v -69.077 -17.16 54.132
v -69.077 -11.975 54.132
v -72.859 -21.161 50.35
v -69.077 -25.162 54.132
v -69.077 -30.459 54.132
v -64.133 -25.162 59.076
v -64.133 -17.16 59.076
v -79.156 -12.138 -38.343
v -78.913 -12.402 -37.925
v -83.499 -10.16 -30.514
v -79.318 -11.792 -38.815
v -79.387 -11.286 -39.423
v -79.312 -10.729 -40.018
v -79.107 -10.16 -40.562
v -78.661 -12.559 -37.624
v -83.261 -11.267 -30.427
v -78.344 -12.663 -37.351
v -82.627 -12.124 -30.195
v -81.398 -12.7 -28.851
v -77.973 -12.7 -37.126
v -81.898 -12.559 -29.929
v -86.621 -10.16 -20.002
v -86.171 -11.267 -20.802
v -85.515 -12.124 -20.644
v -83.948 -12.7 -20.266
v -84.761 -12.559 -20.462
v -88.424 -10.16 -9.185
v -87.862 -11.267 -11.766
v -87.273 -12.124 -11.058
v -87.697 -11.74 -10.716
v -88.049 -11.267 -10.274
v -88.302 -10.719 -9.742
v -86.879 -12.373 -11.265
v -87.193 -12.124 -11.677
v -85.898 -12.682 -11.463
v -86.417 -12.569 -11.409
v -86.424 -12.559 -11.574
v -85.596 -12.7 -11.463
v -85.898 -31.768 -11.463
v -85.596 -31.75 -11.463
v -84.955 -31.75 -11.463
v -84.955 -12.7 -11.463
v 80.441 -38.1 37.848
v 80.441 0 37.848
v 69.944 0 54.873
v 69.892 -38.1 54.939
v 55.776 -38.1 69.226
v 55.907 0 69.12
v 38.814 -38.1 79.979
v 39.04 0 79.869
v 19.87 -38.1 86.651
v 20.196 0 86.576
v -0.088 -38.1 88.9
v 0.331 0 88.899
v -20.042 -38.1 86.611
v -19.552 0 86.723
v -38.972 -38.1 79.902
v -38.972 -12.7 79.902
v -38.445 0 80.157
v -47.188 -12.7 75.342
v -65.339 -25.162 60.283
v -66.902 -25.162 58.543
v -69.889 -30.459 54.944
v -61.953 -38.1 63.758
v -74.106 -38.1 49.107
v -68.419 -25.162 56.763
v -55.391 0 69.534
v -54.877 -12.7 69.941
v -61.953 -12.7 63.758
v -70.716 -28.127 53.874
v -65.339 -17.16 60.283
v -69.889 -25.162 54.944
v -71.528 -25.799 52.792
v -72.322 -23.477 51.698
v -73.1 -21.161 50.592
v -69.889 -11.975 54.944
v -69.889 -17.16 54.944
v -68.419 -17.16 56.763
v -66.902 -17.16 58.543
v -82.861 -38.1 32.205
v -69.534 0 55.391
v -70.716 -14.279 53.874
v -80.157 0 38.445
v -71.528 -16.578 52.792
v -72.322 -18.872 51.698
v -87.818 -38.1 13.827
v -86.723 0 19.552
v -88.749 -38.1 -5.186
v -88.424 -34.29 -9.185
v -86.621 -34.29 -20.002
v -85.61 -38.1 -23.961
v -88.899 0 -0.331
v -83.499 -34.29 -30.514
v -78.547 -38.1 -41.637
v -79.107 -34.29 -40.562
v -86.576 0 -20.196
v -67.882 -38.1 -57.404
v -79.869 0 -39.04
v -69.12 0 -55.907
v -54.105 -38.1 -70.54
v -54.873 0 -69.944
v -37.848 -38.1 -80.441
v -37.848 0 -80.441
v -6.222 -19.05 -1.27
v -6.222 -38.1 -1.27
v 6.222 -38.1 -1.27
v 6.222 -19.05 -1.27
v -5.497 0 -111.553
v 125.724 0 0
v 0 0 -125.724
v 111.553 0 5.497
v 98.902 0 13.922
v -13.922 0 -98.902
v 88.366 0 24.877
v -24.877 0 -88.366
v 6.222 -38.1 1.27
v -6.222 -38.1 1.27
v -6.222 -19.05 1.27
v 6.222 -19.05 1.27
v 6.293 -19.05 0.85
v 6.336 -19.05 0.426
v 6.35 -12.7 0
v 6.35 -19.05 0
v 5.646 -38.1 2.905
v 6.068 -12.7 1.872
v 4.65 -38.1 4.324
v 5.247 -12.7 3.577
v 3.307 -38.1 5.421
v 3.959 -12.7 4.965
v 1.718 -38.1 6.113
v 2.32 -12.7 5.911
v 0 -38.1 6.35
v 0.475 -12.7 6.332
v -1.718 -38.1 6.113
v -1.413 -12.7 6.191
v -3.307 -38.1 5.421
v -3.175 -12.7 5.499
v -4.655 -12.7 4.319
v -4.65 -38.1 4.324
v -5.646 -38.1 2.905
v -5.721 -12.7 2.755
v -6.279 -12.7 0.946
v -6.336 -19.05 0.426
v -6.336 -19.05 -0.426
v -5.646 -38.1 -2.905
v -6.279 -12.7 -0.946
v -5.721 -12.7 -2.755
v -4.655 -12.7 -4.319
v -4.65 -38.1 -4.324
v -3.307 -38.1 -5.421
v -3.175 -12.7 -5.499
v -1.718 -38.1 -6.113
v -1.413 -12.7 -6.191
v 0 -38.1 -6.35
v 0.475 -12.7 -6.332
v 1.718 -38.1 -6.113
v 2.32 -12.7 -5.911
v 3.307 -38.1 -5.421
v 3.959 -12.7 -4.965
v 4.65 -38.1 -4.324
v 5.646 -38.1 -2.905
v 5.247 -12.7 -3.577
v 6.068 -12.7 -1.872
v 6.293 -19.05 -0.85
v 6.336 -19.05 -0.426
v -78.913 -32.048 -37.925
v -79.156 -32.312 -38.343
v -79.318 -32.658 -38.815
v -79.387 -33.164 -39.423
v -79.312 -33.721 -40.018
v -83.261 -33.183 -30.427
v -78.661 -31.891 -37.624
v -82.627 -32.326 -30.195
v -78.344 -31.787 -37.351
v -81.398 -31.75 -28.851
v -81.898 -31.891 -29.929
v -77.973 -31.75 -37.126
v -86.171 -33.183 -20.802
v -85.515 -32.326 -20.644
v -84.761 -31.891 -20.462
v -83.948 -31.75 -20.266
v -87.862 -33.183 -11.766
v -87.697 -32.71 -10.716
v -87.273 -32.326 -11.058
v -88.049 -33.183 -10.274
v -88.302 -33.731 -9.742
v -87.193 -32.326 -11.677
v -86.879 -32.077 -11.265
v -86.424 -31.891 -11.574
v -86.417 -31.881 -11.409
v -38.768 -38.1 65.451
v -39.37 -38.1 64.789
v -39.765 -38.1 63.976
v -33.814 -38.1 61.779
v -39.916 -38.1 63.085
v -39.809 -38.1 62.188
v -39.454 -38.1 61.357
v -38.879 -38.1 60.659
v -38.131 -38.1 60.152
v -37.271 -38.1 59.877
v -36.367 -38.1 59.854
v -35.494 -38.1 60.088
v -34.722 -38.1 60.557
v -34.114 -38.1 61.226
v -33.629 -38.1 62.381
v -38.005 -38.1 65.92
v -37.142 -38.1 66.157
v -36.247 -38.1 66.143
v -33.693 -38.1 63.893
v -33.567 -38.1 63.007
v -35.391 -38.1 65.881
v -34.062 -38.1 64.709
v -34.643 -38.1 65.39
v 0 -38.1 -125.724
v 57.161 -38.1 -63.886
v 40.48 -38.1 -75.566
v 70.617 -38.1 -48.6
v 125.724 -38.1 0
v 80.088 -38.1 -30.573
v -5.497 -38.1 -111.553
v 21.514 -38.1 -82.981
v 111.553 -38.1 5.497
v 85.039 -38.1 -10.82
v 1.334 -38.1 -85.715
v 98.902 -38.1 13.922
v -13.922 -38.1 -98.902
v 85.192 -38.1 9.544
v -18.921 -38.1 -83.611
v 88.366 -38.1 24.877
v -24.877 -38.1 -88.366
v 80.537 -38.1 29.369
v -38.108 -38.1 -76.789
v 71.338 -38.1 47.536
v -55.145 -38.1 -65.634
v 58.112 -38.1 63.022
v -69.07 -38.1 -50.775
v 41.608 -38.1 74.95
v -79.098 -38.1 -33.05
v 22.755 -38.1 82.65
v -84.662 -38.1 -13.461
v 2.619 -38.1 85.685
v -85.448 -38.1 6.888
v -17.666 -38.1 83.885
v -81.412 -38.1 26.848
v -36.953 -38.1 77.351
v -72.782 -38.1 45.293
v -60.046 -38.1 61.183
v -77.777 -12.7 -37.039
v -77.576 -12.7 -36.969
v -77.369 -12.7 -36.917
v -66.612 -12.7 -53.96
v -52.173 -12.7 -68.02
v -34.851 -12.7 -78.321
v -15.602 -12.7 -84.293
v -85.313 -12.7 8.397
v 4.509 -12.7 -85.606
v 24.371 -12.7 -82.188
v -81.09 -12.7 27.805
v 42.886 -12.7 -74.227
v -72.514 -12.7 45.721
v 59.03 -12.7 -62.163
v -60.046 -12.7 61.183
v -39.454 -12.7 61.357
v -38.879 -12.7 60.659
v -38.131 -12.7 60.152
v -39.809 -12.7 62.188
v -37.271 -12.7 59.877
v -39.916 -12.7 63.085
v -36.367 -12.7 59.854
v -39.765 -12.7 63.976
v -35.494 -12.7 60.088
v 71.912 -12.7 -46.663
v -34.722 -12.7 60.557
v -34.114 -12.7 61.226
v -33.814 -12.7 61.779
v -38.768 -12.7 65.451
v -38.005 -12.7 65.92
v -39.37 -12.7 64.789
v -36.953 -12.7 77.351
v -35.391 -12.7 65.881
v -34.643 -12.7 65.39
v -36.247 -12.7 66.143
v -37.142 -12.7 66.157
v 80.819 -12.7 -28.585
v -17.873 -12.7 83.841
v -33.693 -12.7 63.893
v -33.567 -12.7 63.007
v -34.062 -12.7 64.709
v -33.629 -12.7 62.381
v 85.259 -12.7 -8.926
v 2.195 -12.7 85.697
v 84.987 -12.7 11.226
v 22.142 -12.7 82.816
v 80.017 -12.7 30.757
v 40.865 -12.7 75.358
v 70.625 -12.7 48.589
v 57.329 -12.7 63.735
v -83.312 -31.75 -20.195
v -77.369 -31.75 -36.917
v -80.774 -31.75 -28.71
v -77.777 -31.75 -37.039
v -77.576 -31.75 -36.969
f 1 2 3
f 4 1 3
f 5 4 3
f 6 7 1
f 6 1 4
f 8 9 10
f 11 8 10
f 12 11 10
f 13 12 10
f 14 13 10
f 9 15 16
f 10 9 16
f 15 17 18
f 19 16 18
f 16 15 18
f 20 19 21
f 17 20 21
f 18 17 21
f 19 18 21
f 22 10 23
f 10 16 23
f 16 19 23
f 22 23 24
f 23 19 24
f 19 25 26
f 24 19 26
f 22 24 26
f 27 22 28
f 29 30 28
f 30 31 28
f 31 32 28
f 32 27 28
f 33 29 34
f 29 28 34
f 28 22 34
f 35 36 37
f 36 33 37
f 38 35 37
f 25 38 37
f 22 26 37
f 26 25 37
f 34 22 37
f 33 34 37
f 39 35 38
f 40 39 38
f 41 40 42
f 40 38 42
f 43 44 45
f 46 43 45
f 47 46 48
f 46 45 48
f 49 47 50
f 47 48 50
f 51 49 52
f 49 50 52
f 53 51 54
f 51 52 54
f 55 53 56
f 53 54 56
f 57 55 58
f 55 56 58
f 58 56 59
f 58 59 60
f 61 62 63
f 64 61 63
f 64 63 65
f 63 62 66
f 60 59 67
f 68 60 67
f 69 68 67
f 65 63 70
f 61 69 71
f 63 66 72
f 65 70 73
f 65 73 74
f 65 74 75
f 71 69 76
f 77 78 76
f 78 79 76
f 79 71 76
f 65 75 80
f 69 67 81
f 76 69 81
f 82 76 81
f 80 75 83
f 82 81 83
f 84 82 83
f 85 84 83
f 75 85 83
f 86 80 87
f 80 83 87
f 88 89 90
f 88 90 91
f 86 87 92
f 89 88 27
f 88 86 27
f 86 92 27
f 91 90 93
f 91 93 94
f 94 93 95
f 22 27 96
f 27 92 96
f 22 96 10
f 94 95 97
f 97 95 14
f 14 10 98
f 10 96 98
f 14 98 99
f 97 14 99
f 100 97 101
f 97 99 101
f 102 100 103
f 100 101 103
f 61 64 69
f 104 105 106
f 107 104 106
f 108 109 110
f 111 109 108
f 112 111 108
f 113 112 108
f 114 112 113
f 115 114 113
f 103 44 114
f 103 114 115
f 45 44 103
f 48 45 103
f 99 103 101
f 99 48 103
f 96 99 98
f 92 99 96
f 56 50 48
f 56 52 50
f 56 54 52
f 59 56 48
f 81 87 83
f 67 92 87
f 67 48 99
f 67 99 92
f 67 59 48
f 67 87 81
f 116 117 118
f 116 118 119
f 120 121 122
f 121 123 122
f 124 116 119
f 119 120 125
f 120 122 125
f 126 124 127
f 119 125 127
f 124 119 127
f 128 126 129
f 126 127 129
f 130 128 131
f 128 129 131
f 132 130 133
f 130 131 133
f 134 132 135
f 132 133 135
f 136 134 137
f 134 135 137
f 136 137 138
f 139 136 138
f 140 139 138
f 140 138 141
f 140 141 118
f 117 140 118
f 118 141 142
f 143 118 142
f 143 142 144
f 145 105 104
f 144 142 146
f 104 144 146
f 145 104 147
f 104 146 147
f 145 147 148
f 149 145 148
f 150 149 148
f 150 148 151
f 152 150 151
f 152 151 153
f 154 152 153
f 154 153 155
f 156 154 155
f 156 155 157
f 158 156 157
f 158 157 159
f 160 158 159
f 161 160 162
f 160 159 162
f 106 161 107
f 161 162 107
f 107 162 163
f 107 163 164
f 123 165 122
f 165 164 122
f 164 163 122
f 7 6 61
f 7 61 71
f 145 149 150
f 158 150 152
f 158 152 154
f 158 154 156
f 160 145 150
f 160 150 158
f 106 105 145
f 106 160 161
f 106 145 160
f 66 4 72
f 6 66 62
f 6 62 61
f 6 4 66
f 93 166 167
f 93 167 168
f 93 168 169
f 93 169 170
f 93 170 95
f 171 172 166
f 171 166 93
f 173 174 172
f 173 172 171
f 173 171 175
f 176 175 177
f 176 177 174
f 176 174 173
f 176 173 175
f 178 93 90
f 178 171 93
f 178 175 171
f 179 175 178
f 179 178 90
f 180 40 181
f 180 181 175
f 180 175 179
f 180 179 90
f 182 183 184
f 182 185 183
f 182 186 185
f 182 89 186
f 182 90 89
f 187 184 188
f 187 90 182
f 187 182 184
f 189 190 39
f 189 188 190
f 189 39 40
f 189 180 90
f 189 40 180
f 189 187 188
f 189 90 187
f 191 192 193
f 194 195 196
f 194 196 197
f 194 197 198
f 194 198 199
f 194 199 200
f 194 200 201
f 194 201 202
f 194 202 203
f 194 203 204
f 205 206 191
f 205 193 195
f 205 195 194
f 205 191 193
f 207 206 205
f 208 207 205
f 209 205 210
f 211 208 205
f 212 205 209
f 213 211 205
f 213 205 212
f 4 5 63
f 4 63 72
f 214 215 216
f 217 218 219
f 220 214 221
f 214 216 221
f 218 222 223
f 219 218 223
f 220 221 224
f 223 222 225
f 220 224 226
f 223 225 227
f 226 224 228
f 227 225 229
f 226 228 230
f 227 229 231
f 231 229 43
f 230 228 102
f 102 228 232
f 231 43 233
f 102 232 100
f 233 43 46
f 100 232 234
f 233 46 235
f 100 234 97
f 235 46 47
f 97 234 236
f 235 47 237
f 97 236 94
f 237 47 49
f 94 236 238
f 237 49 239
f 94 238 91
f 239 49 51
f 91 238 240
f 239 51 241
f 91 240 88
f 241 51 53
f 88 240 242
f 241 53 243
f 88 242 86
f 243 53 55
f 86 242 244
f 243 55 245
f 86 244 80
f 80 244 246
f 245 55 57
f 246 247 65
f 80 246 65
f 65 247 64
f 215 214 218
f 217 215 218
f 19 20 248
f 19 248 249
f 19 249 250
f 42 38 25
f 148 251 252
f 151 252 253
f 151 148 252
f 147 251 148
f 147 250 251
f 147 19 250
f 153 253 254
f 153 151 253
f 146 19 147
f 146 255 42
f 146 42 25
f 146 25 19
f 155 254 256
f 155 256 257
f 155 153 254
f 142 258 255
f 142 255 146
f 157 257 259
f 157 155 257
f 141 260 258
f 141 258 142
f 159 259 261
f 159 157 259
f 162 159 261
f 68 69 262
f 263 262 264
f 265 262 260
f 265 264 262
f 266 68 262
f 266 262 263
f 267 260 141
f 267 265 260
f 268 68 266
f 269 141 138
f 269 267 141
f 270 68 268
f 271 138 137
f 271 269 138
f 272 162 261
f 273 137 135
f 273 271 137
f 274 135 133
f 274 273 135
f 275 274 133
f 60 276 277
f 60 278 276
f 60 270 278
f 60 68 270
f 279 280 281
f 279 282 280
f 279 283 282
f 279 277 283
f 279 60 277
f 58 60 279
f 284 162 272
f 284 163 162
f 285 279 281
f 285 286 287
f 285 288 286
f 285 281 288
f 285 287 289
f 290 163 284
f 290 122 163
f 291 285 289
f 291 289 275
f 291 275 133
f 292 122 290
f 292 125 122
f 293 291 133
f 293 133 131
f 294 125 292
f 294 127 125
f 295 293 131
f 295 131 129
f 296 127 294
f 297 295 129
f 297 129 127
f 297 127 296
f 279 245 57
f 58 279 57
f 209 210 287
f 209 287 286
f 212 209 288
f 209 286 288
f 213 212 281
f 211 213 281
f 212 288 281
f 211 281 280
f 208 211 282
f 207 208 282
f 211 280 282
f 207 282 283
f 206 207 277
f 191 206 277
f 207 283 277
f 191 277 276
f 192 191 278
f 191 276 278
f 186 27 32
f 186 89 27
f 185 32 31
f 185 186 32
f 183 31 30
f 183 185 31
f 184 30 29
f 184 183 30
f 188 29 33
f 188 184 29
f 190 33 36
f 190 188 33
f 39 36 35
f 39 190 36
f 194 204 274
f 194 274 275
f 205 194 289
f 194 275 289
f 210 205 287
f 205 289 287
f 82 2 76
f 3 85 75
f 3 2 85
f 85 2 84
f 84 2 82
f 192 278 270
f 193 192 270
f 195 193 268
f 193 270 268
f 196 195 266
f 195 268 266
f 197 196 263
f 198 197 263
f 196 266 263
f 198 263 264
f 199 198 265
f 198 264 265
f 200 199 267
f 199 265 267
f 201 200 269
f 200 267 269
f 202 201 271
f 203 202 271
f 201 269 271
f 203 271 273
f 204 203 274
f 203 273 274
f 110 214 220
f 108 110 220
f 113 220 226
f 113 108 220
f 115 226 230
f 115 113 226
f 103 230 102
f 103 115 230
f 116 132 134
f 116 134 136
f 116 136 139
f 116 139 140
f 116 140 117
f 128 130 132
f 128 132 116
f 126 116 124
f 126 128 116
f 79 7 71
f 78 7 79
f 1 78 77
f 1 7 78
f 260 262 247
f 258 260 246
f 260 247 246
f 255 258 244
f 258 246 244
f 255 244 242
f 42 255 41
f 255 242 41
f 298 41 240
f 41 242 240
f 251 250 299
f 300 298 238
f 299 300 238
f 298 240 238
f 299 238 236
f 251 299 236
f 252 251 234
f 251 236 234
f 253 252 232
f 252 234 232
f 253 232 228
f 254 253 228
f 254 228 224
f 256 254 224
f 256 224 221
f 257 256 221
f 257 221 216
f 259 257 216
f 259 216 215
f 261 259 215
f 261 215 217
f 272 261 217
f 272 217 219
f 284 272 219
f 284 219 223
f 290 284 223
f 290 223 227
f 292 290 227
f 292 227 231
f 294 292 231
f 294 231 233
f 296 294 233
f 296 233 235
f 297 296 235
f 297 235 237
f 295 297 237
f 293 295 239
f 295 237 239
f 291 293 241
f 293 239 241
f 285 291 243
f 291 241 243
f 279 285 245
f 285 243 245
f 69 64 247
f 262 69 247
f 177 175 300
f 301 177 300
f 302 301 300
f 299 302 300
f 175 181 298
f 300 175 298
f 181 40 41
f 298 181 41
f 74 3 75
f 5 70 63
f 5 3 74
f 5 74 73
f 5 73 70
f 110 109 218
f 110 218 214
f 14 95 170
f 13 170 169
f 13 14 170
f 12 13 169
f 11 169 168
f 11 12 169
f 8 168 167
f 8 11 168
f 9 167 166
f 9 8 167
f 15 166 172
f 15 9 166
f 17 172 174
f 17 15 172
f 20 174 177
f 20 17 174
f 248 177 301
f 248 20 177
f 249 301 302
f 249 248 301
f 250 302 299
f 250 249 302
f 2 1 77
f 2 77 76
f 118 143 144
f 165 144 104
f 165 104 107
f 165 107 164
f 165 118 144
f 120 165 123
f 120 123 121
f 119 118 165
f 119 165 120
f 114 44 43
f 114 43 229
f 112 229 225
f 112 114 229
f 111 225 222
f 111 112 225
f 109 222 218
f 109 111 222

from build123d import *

# Parameters (mm, degrees)
F0_R          = 88.9
F1_DEPTH      = 12.7
F2_R          = 88.9
F2_R_2        = 82.55
F2_R_3        = 6.35
F3_DEPTH      = 25.4
F5_DEPTH      = 25.4
F7_DEPTH      = 25.4
F8_W          = 12.7
F8_H          = 1.27
F9_DEPTH      = 19.05
F10_W         = 19.05
F10_H         = 25.4
F11_DEPTH     = 88.901
F12_T1_DEPTH  = 19.05
F12_T6_ANGLE  = 25.274429264
F12_T12_ANGLE = 25.274429264
F12_T19_ANGLE = 25.274429264
F12_T23_DEPTH = 24.7827133537
F12_T30_ANGLE = 25.274429264
F12_T34_DEPTH = 24.7827133537
F12_T41_DEPTH = 29.3229812516
F12_T45_ANGLE = 25.274429264
F12_T52_ANGLE = 25.274429264
F12_T56_DEPTH = 29.3229812516
F14_DEPTH     = 25.4
F16_DEPTH     = 38.1
F20_DEPTH     = 25.4


# Not quite as in the source:
# - a fillet or chamfer that OpenCascade refuses, or shapes differently, is made with other operations: its cross-section is extruded or revolved along the edge and cut away or added


with BuildPart() as f1:
    # F0 (on Front) → F1 (new body)
    with BuildSketch(Plane.XZ):
        Circle(F0_R)
    extrude(amount=F1_DEPTH)

    # F2 (on face) → F3 (join)
    with BuildSketch(Plane.XZ.offset(12.7)):
        Circle(F2_R)
        Circle(F2_R_2, mode=Mode.SUBTRACT)
        Circle(F2_R_3)
    extrude(amount=F3_DEPTH)

    # F4 (on face) → F5 (cut)
    with BuildSketch(Plane.XZ.offset(38.1)):
        with BuildLine():
            Line((-34.9300524425, 74.7956812681), (-38.9724939218, 79.9021571518))
            ThreePointArc((-38.9724939218, 79.9021571518), (-51.1040456605, 72.7432919047), (-61.9525410202, 63.7580791833))
            Line((-61.9525410202, 63.7580791833), (-58.1372414147, 58.6051504621))
            ThreePointArc((-58.1372414147, 58.6051504621), (-47.2325482948, 67.7022073612), (-34.9300524425, 74.7956812681))
        make_face()
    extrude(amount=-F5_DEPTH, mode=Mode.SUBTRACT)

    # F6 (on face) → F7 (join)
    with BuildSketch(Plane.XZ.offset(12.7)):
        with BuildLine():
            ThreePointArc((-33.5668462981, 63.0071964846), (-35.8100364522, 66.042382708), (-39.3699048248, 64.7887501268))
            Line((-39.3699048248, 64.7887501268), (-34.1137877714, 61.2256428423))
            ThreePointArc((-34.1137877714, 61.2256428423), (-33.7066600747, 62.0753866387), (-33.5668462981, 63.0071964846))
        make_face()
        with BuildLine():
            Line((-34.1137877714, 61.2256428423), (-39.3699048248, 64.7887501268))
            ThreePointArc((-39.3699048248, 64.7887501268), (-38.5233999404, 60.3791379579), (-34.1137877714, 61.2256428423))
        make_face()
    extrude(amount=F7_DEPTH)

    # F8 (on face) → F9 (cut)
    with BuildSketch(Plane.XZ.offset(38.1)):
        with Locations((0, 0.635)):
            Rectangle(F8_W, F8_H)
        with Locations((0, -0.635)):
            Rectangle(F8_W, F8_H)
    extrude(amount=-F9_DEPTH, mode=Mode.SUBTRACT)

    # F10 (on Right) → F11 (cut, through all)
    with BuildSketch(Plane.YZ):
        with Locations((-22.225, -24.1626900017)):
            Rectangle(F10_W, F10_H)
    extrude(amount=-F11_DEPTH, mode=Mode.SUBTRACT)

    # F12: fillet of radius 2.54 on 4 edges, made by hand

    # F12_s2 → F12_t1 (cut)
    with BuildSketch(Plane.XZ.offset(12.7)):
        with BuildLine():
            ThreePointArc((-88.4242248071, -9.1851220606), (-87.5985568369, -10.8092447226), (-85.897818384, -11.4626900017))
            Line((-85.897818384, -11.4626900017), (-88.1579079716, -11.4626900017))
            ThreePointArc((-88.1579079716, -11.4626900017), (-88.2984101391, -10.3247647385), (-88.4242248071, -9.1851220606))
        make_face()
        with BuildLine():
            ThreePointArc((-79.1073144645, -40.5615926488), (-79.0145016969, -38.078305753), (-76.8471054798, -36.8626900017))
            Line((-76.8471054798, -36.8626900017), (-80.8971698259, -36.8626900017))
            ThreePointArc((-80.8971698259, -36.8626900017), (-80.0236166295, -38.7224841861), (-79.1073144645, -40.5615926488))
        make_face()
    extrude(amount=F12_T1_DEPTH, mode=Mode.SUBTRACT)


with BuildPart() as f12_tool4:
    # F12_s5 → F12_t6 (revolve)
    with BuildSketch(Plane(origin=(0, 0, 0), x_dir=(0, 1, 0), z_dir=(0.478540272, 0, -0.8780656058))):
        with BuildLine():
            ThreePointArc((-10.16, -88.9), (-11.9560512242, -88.1560512242), (-12.7, -86.36))
            Line((-12.7, -86.36), (-12.7, -88.9))
            Line((-12.7, -88.9), (-10.16, -88.9))
        make_face()
    revolve(axis=Axis((0, -12.7, 0), (0, 1, 0)), revolution_arc=F12_T6_ANGLE)

    split(bisect_by=Plane.XY.offset(-11.4626900017), keep=Keep.BOTTOM)

    split(bisect_by=Plane.XY.offset(-36.8626900017), keep=Keep.TOP)


with BuildPart() as f1_1:
    add(f1.part)

    # F12_t3: cut F12_tool4
    add(f12_tool4.part, mode=Mode.SUBTRACT)


with BuildPart() as f12_tool10:
    # F12_s11 → F12_t12 (revolve)
    with BuildSketch(Plane(origin=(0, 0, 0), x_dir=(0, 1, 0), z_dir=(0.478540272, 0, -0.8780656058))):
        with BuildLine():
            ThreePointArc((-34.29, -88.9), (-32.4939487758, -88.1560512242), (-31.75, -86.36))
            Line((-31.75, -86.36), (-31.75, -88.9))
            Line((-31.75, -88.9), (-34.29, -88.9))
        make_face()
    revolve(axis=Axis((0, -31.75, 0), (0, 1, 0)), revolution_arc=F12_T12_ANGLE)

    split(bisect_by=Plane.XY.offset(-36.8626900017), keep=Keep.TOP)

    split(bisect_by=Plane.XY.offset(-11.4626900017), keep=Keep.BOTTOM)


with BuildPart() as f1_2:
    add(f1_1.part)

    # F12_t9: cut F12_tool10
    add(f12_tool10.part, mode=Mode.SUBTRACT)


with BuildPart() as f12_tool17:
    # F12_s18 → F12_t19 (revolve)
    with BuildSketch(Plane(origin=(0, 0, 0), x_dir=(0, 1, 0), z_dir=(0.478540272, 0, -0.8780656058))):
        with BuildLine():
            ThreePointArc((-34.29, -88.9), (-32.4939487758, -88.1560512242), (-31.75, -86.36))
            Line((-31.75, -86.36), (-31.75, -88.9))
            Line((-31.75, -88.9), (-34.29, -88.9))
        make_face()
    revolve(axis=Axis((0, -31.75, 0), (0, 1, 0)), revolution_arc=F12_T19_ANGLE)

    split(bisect_by=Plane.XY.offset(-11.4626900017), keep=Keep.TOP)


with BuildPart() as f12_tool21:
    # F12_s22 → F12_t23 (new body)
    with BuildSketch(Plane.XZ.offset(37.4827133537)):
        with BuildLine():
            ThreePointArc((-88.4242248071, -9.1851220606), (-87.5985568369, -10.8092447226), (-85.897818384, -11.4626900017))
            Line((-85.897818384, -11.4626900017), (-88.1579079716, -11.4626900017))
            ThreePointArc((-88.1579079716, -11.4626900017), (-88.2984101391, -10.3247647385), (-88.4242248071, -9.1851220606))
        make_face()
    extrude(amount=-F12_T23_DEPTH)

    split(bisect_by=Plane.XZ.offset(31.75), keep=Keep.TOP)


with BuildPart() as f12_tool17_1:
    add(f12_tool17.part)

    # F12_t25: intersect F12_tool21
    add(f12_tool21.part, mode=Mode.INTERSECT)


with BuildPart() as f1_3:
    add(f1_2.part)

    # F12_t15: cut F12_tool17
    add(f12_tool17_1.part, mode=Mode.SUBTRACT)


with BuildPart() as f12_tool28:
    # F12_s29 → F12_t30 (revolve)
    with BuildSketch(Plane(origin=(0, 0, 0), x_dir=(0, 1, 0), z_dir=(0.478540272, 0, -0.8780656058))):
        with BuildLine():
            ThreePointArc((-10.16, -88.9), (-11.9560512242, -88.1560512242), (-12.7, -86.36))
            Line((-12.7, -86.36), (-12.7, -88.9))
            Line((-12.7, -88.9), (-10.16, -88.9))
        make_face()
    revolve(axis=Axis((0, -12.7, 0), (0, 1, 0)), revolution_arc=F12_T30_ANGLE)

    split(bisect_by=Plane.XY.offset(-11.4626900017), keep=Keep.TOP)


with BuildPart() as f12_tool32:
    # F12_s33 → F12_t34 (new body)
    with BuildSketch(Plane.XZ.offset(31.75)):
        with BuildLine():
            ThreePointArc((-88.4242248071, -9.1851220606), (-87.5985568369, -10.8092447226), (-85.897818384, -11.4626900017))
            Line((-85.897818384, -11.4626900017), (-88.1579079716, -11.4626900017))
            ThreePointArc((-88.1579079716, -11.4626900017), (-88.2984101391, -10.3247647385), (-88.4242248071, -9.1851220606))
        make_face()
    extrude(amount=-F12_T34_DEPTH)

    split(bisect_by=Plane.XZ.offset(12.7), keep=Keep.BOTTOM)


with BuildPart() as f12_tool28_1:
    add(f12_tool28.part)

    # F12_t36: intersect F12_tool32
    add(f12_tool32.part, mode=Mode.INTERSECT)


with BuildPart() as f1_4:
    add(f1_3.part)

    # F12_t26: cut F12_tool28
    add(f12_tool28_1.part, mode=Mode.SUBTRACT)


with BuildPart() as f12_tool39:
    # F12_s40 → F12_t41 (new body)
    with BuildSketch(Plane.XZ.offset(31.75)):
        with BuildLine():
            ThreePointArc((-79.1073144645, -40.5615926488), (-79.0145016969, -38.078305753), (-76.8471054798, -36.8626900017))
            Line((-76.8471054798, -36.8626900017), (-80.8971698259, -36.8626900017))
            ThreePointArc((-80.8971698259, -36.8626900017), (-80.0236166295, -38.7224841861), (-79.1073144645, -40.5615926488))
        make_face()
    extrude(amount=-F12_T41_DEPTH)

    split(bisect_by=Plane.XZ.offset(12.7), keep=Keep.BOTTOM)


with BuildPart() as f12_tool43:
    # F12_s44 → F12_t45 (revolve)
    with BuildSketch(Plane(origin=(0, 0, 0), x_dir=(0, 1, 0), z_dir=(0.478540272, 0, -0.8780656058))):
        with BuildLine():
            ThreePointArc((-10.16, -88.9), (-11.9560512242, -88.1560512242), (-12.7, -86.36))
            Line((-12.7, -86.36), (-12.7, -88.9))
            Line((-12.7, -88.9), (-10.16, -88.9))
        make_face()
    revolve(axis=Axis((0, -12.7, 0), (0, 1, 0)), revolution_arc=F12_T45_ANGLE)

    split(bisect_by=Plane.XY.offset(-36.8626900017), keep=Keep.BOTTOM)


with BuildPart() as f12_tool39_1:
    add(f12_tool39.part)

    # F12_t47: intersect F12_tool43
    add(f12_tool43.part, mode=Mode.INTERSECT)


with BuildPart() as f1_5:
    add(f1_4.part)

    # F12_t37: cut F12_tool39
    add(f12_tool39_1.part, mode=Mode.SUBTRACT)


with BuildPart() as f12_tool50:
    # F12_s51 → F12_t52 (revolve)
    with BuildSketch(Plane(origin=(0, 0, 0), x_dir=(0, 1, 0), z_dir=(0.478540272, 0, -0.8780656058))):
        with BuildLine():
            ThreePointArc((-34.29, -88.9), (-32.4939487758, -88.1560512242), (-31.75, -86.36))
            Line((-31.75, -86.36), (-31.75, -88.9))
            Line((-31.75, -88.9), (-34.29, -88.9))
        make_face()
    revolve(axis=Axis((0, -31.75, 0), (0, 1, 0)), revolution_arc=F12_T52_ANGLE)

    split(bisect_by=Plane.XY.offset(-36.8626900017), keep=Keep.BOTTOM)


with BuildPart() as f12_tool54:
    # F12_s55 → F12_t56 (new body)
    with BuildSketch(Plane.XZ.offset(42.0229812516)):
        with BuildLine():
            ThreePointArc((-79.1073144645, -40.5615926488), (-79.0145016969, -38.078305753), (-76.8471054798, -36.8626900017))
            Line((-76.8471054798, -36.8626900017), (-80.8971698259, -36.8626900017))
            ThreePointArc((-80.8971698259, -36.8626900017), (-80.0236166295, -38.7224841861), (-79.1073144645, -40.5615926488))
        make_face()
    extrude(amount=-F12_T56_DEPTH)

    split(bisect_by=Plane.XZ.offset(31.75), keep=Keep.TOP)


with BuildPart() as f12_tool50_1:
    add(f12_tool50.part)

    # F12_t58: intersect F12_tool54
    add(f12_tool54.part, mode=Mode.INTERSECT)


with BuildPart() as f1_6:
    add(f1_5.part)

    # F12_t48: cut F12_tool50
    add(f12_tool50_1.part, mode=Mode.SUBTRACT)

    # F13 (on face) → F14 (cut)
    with BuildSketch(Plane.XZ.offset(38.1)):
        with BuildLine():
            ThreePointArc((-34.9300524425, 74.7956812681), (44.3341102926, 69.6346836323), (82.55, 0))
            ThreePointArc((82.55, 0), (-31.7432923719, -76.2027944986), (-58.1372414147, 58.6051504621))
            Line((-58.1372414147, 58.6051504621), (-60.0455804339, 61.1825456757))
            ThreePointArc((-60.0455804339, 61.1825456757), (-33.1765598149, -79.0448701931), (85.725, 0))
            ThreePointArc((85.725, 0), (45.721772873, 72.5141028376), (-36.9532177975, 77.3513756788))
            Line((-36.9532177975, 77.3513756788), (-34.9300524425, 74.7956812681))
        make_face()
    extrude(amount=-F14_DEPTH, mode=Mode.SUBTRACT)

    # F15 (on face) → F16 (join)
    with BuildSketch(Plane(origin=(0, 0, 0), x_dir=(-1, 0, 0), z_dir=(0, 1, 0))):
        with BuildLine():
            Line((-125.723585695, 0), (-62.8617928475, -62.8617928475))
            ThreePointArc((-62.8617928475, -62.8617928475), (-87.5758152323, -15.286810864), (-80.4411250184, 37.8475283972))
            ThreePointArc((-80.4411250184, 37.8475283972), (-98.9019872856, 13.9221865314), (-125.723585695, 0))
        make_face()
        with BuildLine():
            ThreePointArc((37.8475283972, -80.4411250184), (19.3906418907, -86.7595124875), (0, -88.9))
            ThreePointArc((0, -88.9), (-34.0205571373, -82.1328904403), (-62.8617928475, -62.8617928475))
            Line((-62.8617928475, -62.8617928475), (0, -125.723585695))
            ThreePointArc((0, -125.723585695), (13.9221865314, -98.9019872856), (37.8475283972, -80.4411250184))
        make_face()
    extrude(amount=-F16_DEPTH)

    # F19 (on face) → F20 (cut)
    with BuildSketch(Plane(origin=(-61.6045569905, 0, 61.6045569905), x_dir=(0, -1, 0), z_dir=(-0.7071067812, 0, 0.7071067812))):
        Polygon((25.1616425812, -3.5754330456), (17.159935087, -3.5754330456), (17.159935087, -10.567618534), (11.9749652222, -10.567618534), (21.1607888341, -15.9158930182), (30.4591618478, -10.567618534), (25.1616425812, -10.567618534), align=None)
    extrude(amount=F20_DEPTH, mode=Mode.SUBTRACT)


solid = f1_6.part
